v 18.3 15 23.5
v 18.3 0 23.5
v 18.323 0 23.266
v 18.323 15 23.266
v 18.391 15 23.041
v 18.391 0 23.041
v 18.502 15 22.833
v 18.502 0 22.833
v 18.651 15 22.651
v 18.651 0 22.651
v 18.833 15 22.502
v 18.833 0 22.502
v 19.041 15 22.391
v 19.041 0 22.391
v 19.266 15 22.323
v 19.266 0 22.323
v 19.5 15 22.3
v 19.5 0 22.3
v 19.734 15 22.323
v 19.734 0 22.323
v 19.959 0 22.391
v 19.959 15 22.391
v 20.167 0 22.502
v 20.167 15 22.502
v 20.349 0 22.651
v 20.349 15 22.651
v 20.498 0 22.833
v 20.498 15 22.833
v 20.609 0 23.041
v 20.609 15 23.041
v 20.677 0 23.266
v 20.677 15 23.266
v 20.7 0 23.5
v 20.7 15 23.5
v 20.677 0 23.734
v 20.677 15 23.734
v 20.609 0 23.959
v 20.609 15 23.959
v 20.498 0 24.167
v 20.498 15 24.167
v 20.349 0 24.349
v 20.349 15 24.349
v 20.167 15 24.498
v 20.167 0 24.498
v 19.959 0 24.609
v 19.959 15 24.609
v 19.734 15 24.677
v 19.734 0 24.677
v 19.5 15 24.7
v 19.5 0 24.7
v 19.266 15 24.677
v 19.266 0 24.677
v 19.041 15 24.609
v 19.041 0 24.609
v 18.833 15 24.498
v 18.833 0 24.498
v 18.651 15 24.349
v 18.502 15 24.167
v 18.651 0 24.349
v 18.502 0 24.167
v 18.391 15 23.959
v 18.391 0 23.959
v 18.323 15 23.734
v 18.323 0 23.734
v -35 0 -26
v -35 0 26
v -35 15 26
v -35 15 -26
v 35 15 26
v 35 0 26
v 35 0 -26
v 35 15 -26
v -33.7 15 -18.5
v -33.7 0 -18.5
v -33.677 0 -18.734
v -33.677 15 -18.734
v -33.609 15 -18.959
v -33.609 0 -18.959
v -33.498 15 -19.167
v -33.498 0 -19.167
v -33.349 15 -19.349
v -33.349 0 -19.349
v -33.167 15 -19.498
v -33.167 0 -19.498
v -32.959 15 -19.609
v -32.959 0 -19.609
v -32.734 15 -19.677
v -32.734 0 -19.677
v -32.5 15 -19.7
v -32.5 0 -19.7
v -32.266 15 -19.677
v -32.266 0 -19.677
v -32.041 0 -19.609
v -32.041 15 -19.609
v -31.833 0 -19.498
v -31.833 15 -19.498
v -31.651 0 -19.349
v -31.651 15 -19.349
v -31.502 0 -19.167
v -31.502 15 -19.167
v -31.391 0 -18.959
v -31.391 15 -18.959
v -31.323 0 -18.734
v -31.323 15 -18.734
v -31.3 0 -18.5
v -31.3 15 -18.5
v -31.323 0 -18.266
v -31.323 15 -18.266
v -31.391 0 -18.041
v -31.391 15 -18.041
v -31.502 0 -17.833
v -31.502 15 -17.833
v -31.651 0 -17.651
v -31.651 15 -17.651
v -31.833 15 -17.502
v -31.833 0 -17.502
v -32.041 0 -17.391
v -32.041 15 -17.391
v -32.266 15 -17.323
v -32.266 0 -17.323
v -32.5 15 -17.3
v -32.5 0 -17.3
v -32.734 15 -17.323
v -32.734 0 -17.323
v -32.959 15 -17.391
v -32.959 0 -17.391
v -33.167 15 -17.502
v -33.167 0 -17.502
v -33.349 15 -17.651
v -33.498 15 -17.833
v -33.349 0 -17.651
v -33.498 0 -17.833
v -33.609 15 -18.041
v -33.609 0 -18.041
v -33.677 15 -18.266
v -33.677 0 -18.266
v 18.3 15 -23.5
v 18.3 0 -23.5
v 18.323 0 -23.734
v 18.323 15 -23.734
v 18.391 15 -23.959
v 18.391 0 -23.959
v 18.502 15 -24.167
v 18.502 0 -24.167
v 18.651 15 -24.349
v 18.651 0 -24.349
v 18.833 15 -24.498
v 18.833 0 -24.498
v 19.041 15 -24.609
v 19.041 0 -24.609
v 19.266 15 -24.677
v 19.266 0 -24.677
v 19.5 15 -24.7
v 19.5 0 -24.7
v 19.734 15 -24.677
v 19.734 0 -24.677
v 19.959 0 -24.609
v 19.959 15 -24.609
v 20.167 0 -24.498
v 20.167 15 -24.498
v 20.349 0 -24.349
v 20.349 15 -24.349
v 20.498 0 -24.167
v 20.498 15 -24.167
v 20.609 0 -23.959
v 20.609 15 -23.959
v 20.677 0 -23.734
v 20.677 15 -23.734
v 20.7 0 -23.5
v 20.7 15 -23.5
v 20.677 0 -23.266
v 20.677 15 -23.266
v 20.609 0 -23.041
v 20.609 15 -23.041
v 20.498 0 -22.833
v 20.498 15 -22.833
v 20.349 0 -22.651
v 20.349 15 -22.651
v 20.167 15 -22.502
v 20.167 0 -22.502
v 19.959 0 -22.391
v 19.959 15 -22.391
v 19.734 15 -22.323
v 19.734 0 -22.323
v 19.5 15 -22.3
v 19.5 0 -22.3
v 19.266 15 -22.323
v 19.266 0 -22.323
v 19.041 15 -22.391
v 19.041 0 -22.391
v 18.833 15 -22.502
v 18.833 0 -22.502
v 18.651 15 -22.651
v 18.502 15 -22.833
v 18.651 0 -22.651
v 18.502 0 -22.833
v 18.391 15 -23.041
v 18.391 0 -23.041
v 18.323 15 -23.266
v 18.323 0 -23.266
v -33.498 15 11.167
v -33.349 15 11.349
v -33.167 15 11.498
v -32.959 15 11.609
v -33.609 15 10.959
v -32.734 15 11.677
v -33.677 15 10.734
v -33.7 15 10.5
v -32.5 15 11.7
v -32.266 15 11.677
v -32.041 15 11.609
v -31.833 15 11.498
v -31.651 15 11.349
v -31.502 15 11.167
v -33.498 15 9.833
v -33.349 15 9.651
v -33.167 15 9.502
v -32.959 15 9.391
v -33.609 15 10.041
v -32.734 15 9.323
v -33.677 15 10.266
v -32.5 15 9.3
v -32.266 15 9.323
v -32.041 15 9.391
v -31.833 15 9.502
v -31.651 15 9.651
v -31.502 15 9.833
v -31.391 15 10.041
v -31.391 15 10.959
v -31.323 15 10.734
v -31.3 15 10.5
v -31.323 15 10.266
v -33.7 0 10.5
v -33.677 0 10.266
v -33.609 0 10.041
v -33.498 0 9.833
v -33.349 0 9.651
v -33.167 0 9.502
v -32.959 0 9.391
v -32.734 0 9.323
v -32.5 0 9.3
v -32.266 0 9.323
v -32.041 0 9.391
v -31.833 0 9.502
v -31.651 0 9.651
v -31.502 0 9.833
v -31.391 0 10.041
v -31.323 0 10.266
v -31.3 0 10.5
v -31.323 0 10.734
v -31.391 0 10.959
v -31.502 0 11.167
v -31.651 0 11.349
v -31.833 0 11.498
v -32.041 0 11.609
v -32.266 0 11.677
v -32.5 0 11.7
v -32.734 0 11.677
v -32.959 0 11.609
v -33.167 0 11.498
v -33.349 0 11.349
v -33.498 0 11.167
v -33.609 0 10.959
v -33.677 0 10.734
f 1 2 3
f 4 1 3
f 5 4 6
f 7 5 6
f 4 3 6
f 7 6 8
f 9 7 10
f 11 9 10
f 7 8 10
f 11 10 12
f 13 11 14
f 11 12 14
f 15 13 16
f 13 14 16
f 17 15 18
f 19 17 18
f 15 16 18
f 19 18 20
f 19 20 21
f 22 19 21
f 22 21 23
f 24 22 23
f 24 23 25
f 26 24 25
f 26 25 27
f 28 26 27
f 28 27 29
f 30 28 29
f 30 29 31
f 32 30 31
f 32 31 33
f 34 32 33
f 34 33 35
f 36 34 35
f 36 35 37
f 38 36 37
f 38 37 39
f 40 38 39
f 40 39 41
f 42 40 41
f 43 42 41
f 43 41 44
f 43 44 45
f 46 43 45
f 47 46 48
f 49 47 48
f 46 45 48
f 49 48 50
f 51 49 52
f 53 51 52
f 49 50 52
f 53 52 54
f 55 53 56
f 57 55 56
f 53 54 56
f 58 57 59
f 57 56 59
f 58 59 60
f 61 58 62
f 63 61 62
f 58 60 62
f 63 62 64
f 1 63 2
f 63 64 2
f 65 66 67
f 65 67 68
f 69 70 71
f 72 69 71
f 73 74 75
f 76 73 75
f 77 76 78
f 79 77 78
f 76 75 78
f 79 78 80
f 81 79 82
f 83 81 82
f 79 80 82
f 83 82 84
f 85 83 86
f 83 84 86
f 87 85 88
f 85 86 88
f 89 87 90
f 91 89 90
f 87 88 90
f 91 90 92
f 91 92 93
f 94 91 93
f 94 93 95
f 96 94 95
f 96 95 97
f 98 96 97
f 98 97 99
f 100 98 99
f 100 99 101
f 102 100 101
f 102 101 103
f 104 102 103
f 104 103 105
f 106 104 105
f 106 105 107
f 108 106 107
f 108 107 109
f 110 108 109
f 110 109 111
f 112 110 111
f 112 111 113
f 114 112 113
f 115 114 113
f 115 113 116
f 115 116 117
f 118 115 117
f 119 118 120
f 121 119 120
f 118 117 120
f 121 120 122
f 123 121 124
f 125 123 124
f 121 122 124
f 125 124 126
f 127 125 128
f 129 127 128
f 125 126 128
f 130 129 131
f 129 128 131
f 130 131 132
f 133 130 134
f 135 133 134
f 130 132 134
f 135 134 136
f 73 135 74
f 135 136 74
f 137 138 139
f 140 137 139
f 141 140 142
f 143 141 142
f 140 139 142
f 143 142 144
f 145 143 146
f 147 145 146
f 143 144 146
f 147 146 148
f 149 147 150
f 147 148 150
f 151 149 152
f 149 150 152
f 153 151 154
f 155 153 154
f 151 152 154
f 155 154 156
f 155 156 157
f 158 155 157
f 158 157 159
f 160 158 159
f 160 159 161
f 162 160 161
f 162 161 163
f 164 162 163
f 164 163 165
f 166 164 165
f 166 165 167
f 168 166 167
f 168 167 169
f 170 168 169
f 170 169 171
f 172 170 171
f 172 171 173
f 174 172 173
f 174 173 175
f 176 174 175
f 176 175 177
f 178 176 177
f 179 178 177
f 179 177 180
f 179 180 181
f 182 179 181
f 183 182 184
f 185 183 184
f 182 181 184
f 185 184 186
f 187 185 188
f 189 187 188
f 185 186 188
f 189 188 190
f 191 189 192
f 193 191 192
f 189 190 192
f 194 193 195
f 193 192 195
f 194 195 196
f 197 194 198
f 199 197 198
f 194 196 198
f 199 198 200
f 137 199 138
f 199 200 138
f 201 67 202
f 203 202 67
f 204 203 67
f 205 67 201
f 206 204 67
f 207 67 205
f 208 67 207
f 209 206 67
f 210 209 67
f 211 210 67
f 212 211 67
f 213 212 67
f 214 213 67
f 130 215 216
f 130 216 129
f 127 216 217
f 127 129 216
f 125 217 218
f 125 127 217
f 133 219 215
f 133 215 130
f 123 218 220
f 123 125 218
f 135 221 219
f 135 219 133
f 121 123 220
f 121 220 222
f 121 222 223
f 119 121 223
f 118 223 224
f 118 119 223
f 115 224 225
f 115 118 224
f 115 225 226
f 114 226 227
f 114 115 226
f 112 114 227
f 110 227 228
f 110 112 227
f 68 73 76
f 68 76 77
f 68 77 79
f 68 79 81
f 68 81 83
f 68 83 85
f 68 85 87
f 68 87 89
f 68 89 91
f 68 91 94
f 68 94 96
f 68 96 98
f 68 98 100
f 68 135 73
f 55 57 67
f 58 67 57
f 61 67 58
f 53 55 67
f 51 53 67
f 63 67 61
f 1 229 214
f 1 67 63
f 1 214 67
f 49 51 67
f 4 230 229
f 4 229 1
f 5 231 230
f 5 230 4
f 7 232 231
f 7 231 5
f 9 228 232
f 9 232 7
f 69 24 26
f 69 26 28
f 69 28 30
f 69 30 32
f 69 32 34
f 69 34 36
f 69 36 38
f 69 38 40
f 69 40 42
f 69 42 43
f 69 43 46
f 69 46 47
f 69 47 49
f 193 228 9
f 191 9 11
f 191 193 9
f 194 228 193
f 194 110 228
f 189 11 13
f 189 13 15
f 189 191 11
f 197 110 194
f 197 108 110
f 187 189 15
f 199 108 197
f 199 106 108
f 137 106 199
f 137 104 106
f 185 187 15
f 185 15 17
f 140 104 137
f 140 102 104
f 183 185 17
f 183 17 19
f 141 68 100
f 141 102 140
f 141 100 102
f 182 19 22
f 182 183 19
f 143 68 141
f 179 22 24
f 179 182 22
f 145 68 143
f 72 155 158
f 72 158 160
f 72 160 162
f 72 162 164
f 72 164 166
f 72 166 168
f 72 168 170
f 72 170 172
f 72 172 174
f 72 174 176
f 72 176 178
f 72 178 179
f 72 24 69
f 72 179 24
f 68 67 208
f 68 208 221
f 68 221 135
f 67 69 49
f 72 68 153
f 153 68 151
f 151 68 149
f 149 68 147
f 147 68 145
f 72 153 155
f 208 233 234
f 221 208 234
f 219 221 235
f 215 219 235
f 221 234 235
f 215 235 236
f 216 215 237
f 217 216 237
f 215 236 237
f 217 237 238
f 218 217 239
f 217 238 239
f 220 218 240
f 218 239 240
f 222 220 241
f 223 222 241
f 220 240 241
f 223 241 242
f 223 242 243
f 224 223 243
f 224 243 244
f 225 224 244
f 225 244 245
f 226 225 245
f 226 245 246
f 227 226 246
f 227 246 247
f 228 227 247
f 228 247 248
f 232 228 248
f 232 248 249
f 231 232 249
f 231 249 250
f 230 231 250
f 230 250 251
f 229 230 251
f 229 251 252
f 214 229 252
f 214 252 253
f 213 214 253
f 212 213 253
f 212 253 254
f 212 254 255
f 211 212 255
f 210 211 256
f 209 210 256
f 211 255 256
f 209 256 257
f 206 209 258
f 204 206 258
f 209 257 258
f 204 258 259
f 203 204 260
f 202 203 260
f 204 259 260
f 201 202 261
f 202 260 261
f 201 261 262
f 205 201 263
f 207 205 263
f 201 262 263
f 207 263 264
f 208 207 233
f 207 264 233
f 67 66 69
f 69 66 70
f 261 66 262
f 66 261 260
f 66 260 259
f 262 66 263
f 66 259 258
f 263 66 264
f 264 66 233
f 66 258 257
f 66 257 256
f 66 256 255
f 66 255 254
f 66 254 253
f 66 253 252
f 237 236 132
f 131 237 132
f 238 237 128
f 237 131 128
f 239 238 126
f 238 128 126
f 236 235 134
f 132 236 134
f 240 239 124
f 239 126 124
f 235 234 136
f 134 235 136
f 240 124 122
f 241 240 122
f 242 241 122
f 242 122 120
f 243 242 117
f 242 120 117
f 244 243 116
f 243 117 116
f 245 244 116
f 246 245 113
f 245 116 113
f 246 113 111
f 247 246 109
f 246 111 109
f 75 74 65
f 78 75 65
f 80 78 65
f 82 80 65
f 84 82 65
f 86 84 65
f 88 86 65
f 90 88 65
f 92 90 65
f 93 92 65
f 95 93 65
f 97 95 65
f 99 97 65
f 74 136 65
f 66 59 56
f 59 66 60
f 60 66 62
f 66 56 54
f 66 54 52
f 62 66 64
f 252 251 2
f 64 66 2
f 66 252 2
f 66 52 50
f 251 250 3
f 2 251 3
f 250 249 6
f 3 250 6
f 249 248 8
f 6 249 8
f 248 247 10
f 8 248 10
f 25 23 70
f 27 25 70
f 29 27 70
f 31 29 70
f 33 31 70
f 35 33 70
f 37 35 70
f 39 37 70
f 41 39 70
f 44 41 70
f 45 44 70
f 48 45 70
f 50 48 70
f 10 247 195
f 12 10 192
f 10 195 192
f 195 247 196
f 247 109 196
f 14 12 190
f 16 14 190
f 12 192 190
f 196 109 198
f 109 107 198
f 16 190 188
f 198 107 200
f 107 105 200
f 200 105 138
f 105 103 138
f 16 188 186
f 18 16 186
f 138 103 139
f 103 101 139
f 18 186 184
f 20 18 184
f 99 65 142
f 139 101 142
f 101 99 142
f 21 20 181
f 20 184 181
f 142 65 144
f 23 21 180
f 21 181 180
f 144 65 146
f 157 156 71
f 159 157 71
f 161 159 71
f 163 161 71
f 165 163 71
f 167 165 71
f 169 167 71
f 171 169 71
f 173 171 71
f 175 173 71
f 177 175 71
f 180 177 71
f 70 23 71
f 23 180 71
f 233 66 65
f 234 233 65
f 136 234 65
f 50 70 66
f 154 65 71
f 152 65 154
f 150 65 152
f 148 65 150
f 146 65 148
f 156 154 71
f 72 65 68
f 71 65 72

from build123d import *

# Parameters (mm, degrees)
SCHIZZO2_W                   = 70
SCHIZZO2_H                   = 52
ESTRUSIONE_ESTRUSIONE1_DEPTH = 15
FORO_PER_VITE_M2_1_D         = 2.4


with BuildPart() as part:
    # Schizzo2 → Estrusione-Estrusione1 (new body)
    with BuildSketch(Plane(origin=(0, 0, 0), x_dir=(1, 0, 0), z_dir=(0, 1, 0))):
        Rectangle(SCHIZZO2_W, SCHIZZO2_H)
    extrude(amount=ESTRUSIONE_ESTRUSIONE1_DEPTH)

    # Foro per Vite M2-1 (through all)
    with Locations(Plane(origin=(0, 15, 0), x_dir=(1, 0, 0), z_dir=(0, 1, 0))):
        with Locations((19.5, -23.5), (19.5, 23.5), (-32.5, 18.5), (-32.5, -10.5)):
            Hole(FORO_PER_VITE_M2_1_D / 2)


solid = part.part
